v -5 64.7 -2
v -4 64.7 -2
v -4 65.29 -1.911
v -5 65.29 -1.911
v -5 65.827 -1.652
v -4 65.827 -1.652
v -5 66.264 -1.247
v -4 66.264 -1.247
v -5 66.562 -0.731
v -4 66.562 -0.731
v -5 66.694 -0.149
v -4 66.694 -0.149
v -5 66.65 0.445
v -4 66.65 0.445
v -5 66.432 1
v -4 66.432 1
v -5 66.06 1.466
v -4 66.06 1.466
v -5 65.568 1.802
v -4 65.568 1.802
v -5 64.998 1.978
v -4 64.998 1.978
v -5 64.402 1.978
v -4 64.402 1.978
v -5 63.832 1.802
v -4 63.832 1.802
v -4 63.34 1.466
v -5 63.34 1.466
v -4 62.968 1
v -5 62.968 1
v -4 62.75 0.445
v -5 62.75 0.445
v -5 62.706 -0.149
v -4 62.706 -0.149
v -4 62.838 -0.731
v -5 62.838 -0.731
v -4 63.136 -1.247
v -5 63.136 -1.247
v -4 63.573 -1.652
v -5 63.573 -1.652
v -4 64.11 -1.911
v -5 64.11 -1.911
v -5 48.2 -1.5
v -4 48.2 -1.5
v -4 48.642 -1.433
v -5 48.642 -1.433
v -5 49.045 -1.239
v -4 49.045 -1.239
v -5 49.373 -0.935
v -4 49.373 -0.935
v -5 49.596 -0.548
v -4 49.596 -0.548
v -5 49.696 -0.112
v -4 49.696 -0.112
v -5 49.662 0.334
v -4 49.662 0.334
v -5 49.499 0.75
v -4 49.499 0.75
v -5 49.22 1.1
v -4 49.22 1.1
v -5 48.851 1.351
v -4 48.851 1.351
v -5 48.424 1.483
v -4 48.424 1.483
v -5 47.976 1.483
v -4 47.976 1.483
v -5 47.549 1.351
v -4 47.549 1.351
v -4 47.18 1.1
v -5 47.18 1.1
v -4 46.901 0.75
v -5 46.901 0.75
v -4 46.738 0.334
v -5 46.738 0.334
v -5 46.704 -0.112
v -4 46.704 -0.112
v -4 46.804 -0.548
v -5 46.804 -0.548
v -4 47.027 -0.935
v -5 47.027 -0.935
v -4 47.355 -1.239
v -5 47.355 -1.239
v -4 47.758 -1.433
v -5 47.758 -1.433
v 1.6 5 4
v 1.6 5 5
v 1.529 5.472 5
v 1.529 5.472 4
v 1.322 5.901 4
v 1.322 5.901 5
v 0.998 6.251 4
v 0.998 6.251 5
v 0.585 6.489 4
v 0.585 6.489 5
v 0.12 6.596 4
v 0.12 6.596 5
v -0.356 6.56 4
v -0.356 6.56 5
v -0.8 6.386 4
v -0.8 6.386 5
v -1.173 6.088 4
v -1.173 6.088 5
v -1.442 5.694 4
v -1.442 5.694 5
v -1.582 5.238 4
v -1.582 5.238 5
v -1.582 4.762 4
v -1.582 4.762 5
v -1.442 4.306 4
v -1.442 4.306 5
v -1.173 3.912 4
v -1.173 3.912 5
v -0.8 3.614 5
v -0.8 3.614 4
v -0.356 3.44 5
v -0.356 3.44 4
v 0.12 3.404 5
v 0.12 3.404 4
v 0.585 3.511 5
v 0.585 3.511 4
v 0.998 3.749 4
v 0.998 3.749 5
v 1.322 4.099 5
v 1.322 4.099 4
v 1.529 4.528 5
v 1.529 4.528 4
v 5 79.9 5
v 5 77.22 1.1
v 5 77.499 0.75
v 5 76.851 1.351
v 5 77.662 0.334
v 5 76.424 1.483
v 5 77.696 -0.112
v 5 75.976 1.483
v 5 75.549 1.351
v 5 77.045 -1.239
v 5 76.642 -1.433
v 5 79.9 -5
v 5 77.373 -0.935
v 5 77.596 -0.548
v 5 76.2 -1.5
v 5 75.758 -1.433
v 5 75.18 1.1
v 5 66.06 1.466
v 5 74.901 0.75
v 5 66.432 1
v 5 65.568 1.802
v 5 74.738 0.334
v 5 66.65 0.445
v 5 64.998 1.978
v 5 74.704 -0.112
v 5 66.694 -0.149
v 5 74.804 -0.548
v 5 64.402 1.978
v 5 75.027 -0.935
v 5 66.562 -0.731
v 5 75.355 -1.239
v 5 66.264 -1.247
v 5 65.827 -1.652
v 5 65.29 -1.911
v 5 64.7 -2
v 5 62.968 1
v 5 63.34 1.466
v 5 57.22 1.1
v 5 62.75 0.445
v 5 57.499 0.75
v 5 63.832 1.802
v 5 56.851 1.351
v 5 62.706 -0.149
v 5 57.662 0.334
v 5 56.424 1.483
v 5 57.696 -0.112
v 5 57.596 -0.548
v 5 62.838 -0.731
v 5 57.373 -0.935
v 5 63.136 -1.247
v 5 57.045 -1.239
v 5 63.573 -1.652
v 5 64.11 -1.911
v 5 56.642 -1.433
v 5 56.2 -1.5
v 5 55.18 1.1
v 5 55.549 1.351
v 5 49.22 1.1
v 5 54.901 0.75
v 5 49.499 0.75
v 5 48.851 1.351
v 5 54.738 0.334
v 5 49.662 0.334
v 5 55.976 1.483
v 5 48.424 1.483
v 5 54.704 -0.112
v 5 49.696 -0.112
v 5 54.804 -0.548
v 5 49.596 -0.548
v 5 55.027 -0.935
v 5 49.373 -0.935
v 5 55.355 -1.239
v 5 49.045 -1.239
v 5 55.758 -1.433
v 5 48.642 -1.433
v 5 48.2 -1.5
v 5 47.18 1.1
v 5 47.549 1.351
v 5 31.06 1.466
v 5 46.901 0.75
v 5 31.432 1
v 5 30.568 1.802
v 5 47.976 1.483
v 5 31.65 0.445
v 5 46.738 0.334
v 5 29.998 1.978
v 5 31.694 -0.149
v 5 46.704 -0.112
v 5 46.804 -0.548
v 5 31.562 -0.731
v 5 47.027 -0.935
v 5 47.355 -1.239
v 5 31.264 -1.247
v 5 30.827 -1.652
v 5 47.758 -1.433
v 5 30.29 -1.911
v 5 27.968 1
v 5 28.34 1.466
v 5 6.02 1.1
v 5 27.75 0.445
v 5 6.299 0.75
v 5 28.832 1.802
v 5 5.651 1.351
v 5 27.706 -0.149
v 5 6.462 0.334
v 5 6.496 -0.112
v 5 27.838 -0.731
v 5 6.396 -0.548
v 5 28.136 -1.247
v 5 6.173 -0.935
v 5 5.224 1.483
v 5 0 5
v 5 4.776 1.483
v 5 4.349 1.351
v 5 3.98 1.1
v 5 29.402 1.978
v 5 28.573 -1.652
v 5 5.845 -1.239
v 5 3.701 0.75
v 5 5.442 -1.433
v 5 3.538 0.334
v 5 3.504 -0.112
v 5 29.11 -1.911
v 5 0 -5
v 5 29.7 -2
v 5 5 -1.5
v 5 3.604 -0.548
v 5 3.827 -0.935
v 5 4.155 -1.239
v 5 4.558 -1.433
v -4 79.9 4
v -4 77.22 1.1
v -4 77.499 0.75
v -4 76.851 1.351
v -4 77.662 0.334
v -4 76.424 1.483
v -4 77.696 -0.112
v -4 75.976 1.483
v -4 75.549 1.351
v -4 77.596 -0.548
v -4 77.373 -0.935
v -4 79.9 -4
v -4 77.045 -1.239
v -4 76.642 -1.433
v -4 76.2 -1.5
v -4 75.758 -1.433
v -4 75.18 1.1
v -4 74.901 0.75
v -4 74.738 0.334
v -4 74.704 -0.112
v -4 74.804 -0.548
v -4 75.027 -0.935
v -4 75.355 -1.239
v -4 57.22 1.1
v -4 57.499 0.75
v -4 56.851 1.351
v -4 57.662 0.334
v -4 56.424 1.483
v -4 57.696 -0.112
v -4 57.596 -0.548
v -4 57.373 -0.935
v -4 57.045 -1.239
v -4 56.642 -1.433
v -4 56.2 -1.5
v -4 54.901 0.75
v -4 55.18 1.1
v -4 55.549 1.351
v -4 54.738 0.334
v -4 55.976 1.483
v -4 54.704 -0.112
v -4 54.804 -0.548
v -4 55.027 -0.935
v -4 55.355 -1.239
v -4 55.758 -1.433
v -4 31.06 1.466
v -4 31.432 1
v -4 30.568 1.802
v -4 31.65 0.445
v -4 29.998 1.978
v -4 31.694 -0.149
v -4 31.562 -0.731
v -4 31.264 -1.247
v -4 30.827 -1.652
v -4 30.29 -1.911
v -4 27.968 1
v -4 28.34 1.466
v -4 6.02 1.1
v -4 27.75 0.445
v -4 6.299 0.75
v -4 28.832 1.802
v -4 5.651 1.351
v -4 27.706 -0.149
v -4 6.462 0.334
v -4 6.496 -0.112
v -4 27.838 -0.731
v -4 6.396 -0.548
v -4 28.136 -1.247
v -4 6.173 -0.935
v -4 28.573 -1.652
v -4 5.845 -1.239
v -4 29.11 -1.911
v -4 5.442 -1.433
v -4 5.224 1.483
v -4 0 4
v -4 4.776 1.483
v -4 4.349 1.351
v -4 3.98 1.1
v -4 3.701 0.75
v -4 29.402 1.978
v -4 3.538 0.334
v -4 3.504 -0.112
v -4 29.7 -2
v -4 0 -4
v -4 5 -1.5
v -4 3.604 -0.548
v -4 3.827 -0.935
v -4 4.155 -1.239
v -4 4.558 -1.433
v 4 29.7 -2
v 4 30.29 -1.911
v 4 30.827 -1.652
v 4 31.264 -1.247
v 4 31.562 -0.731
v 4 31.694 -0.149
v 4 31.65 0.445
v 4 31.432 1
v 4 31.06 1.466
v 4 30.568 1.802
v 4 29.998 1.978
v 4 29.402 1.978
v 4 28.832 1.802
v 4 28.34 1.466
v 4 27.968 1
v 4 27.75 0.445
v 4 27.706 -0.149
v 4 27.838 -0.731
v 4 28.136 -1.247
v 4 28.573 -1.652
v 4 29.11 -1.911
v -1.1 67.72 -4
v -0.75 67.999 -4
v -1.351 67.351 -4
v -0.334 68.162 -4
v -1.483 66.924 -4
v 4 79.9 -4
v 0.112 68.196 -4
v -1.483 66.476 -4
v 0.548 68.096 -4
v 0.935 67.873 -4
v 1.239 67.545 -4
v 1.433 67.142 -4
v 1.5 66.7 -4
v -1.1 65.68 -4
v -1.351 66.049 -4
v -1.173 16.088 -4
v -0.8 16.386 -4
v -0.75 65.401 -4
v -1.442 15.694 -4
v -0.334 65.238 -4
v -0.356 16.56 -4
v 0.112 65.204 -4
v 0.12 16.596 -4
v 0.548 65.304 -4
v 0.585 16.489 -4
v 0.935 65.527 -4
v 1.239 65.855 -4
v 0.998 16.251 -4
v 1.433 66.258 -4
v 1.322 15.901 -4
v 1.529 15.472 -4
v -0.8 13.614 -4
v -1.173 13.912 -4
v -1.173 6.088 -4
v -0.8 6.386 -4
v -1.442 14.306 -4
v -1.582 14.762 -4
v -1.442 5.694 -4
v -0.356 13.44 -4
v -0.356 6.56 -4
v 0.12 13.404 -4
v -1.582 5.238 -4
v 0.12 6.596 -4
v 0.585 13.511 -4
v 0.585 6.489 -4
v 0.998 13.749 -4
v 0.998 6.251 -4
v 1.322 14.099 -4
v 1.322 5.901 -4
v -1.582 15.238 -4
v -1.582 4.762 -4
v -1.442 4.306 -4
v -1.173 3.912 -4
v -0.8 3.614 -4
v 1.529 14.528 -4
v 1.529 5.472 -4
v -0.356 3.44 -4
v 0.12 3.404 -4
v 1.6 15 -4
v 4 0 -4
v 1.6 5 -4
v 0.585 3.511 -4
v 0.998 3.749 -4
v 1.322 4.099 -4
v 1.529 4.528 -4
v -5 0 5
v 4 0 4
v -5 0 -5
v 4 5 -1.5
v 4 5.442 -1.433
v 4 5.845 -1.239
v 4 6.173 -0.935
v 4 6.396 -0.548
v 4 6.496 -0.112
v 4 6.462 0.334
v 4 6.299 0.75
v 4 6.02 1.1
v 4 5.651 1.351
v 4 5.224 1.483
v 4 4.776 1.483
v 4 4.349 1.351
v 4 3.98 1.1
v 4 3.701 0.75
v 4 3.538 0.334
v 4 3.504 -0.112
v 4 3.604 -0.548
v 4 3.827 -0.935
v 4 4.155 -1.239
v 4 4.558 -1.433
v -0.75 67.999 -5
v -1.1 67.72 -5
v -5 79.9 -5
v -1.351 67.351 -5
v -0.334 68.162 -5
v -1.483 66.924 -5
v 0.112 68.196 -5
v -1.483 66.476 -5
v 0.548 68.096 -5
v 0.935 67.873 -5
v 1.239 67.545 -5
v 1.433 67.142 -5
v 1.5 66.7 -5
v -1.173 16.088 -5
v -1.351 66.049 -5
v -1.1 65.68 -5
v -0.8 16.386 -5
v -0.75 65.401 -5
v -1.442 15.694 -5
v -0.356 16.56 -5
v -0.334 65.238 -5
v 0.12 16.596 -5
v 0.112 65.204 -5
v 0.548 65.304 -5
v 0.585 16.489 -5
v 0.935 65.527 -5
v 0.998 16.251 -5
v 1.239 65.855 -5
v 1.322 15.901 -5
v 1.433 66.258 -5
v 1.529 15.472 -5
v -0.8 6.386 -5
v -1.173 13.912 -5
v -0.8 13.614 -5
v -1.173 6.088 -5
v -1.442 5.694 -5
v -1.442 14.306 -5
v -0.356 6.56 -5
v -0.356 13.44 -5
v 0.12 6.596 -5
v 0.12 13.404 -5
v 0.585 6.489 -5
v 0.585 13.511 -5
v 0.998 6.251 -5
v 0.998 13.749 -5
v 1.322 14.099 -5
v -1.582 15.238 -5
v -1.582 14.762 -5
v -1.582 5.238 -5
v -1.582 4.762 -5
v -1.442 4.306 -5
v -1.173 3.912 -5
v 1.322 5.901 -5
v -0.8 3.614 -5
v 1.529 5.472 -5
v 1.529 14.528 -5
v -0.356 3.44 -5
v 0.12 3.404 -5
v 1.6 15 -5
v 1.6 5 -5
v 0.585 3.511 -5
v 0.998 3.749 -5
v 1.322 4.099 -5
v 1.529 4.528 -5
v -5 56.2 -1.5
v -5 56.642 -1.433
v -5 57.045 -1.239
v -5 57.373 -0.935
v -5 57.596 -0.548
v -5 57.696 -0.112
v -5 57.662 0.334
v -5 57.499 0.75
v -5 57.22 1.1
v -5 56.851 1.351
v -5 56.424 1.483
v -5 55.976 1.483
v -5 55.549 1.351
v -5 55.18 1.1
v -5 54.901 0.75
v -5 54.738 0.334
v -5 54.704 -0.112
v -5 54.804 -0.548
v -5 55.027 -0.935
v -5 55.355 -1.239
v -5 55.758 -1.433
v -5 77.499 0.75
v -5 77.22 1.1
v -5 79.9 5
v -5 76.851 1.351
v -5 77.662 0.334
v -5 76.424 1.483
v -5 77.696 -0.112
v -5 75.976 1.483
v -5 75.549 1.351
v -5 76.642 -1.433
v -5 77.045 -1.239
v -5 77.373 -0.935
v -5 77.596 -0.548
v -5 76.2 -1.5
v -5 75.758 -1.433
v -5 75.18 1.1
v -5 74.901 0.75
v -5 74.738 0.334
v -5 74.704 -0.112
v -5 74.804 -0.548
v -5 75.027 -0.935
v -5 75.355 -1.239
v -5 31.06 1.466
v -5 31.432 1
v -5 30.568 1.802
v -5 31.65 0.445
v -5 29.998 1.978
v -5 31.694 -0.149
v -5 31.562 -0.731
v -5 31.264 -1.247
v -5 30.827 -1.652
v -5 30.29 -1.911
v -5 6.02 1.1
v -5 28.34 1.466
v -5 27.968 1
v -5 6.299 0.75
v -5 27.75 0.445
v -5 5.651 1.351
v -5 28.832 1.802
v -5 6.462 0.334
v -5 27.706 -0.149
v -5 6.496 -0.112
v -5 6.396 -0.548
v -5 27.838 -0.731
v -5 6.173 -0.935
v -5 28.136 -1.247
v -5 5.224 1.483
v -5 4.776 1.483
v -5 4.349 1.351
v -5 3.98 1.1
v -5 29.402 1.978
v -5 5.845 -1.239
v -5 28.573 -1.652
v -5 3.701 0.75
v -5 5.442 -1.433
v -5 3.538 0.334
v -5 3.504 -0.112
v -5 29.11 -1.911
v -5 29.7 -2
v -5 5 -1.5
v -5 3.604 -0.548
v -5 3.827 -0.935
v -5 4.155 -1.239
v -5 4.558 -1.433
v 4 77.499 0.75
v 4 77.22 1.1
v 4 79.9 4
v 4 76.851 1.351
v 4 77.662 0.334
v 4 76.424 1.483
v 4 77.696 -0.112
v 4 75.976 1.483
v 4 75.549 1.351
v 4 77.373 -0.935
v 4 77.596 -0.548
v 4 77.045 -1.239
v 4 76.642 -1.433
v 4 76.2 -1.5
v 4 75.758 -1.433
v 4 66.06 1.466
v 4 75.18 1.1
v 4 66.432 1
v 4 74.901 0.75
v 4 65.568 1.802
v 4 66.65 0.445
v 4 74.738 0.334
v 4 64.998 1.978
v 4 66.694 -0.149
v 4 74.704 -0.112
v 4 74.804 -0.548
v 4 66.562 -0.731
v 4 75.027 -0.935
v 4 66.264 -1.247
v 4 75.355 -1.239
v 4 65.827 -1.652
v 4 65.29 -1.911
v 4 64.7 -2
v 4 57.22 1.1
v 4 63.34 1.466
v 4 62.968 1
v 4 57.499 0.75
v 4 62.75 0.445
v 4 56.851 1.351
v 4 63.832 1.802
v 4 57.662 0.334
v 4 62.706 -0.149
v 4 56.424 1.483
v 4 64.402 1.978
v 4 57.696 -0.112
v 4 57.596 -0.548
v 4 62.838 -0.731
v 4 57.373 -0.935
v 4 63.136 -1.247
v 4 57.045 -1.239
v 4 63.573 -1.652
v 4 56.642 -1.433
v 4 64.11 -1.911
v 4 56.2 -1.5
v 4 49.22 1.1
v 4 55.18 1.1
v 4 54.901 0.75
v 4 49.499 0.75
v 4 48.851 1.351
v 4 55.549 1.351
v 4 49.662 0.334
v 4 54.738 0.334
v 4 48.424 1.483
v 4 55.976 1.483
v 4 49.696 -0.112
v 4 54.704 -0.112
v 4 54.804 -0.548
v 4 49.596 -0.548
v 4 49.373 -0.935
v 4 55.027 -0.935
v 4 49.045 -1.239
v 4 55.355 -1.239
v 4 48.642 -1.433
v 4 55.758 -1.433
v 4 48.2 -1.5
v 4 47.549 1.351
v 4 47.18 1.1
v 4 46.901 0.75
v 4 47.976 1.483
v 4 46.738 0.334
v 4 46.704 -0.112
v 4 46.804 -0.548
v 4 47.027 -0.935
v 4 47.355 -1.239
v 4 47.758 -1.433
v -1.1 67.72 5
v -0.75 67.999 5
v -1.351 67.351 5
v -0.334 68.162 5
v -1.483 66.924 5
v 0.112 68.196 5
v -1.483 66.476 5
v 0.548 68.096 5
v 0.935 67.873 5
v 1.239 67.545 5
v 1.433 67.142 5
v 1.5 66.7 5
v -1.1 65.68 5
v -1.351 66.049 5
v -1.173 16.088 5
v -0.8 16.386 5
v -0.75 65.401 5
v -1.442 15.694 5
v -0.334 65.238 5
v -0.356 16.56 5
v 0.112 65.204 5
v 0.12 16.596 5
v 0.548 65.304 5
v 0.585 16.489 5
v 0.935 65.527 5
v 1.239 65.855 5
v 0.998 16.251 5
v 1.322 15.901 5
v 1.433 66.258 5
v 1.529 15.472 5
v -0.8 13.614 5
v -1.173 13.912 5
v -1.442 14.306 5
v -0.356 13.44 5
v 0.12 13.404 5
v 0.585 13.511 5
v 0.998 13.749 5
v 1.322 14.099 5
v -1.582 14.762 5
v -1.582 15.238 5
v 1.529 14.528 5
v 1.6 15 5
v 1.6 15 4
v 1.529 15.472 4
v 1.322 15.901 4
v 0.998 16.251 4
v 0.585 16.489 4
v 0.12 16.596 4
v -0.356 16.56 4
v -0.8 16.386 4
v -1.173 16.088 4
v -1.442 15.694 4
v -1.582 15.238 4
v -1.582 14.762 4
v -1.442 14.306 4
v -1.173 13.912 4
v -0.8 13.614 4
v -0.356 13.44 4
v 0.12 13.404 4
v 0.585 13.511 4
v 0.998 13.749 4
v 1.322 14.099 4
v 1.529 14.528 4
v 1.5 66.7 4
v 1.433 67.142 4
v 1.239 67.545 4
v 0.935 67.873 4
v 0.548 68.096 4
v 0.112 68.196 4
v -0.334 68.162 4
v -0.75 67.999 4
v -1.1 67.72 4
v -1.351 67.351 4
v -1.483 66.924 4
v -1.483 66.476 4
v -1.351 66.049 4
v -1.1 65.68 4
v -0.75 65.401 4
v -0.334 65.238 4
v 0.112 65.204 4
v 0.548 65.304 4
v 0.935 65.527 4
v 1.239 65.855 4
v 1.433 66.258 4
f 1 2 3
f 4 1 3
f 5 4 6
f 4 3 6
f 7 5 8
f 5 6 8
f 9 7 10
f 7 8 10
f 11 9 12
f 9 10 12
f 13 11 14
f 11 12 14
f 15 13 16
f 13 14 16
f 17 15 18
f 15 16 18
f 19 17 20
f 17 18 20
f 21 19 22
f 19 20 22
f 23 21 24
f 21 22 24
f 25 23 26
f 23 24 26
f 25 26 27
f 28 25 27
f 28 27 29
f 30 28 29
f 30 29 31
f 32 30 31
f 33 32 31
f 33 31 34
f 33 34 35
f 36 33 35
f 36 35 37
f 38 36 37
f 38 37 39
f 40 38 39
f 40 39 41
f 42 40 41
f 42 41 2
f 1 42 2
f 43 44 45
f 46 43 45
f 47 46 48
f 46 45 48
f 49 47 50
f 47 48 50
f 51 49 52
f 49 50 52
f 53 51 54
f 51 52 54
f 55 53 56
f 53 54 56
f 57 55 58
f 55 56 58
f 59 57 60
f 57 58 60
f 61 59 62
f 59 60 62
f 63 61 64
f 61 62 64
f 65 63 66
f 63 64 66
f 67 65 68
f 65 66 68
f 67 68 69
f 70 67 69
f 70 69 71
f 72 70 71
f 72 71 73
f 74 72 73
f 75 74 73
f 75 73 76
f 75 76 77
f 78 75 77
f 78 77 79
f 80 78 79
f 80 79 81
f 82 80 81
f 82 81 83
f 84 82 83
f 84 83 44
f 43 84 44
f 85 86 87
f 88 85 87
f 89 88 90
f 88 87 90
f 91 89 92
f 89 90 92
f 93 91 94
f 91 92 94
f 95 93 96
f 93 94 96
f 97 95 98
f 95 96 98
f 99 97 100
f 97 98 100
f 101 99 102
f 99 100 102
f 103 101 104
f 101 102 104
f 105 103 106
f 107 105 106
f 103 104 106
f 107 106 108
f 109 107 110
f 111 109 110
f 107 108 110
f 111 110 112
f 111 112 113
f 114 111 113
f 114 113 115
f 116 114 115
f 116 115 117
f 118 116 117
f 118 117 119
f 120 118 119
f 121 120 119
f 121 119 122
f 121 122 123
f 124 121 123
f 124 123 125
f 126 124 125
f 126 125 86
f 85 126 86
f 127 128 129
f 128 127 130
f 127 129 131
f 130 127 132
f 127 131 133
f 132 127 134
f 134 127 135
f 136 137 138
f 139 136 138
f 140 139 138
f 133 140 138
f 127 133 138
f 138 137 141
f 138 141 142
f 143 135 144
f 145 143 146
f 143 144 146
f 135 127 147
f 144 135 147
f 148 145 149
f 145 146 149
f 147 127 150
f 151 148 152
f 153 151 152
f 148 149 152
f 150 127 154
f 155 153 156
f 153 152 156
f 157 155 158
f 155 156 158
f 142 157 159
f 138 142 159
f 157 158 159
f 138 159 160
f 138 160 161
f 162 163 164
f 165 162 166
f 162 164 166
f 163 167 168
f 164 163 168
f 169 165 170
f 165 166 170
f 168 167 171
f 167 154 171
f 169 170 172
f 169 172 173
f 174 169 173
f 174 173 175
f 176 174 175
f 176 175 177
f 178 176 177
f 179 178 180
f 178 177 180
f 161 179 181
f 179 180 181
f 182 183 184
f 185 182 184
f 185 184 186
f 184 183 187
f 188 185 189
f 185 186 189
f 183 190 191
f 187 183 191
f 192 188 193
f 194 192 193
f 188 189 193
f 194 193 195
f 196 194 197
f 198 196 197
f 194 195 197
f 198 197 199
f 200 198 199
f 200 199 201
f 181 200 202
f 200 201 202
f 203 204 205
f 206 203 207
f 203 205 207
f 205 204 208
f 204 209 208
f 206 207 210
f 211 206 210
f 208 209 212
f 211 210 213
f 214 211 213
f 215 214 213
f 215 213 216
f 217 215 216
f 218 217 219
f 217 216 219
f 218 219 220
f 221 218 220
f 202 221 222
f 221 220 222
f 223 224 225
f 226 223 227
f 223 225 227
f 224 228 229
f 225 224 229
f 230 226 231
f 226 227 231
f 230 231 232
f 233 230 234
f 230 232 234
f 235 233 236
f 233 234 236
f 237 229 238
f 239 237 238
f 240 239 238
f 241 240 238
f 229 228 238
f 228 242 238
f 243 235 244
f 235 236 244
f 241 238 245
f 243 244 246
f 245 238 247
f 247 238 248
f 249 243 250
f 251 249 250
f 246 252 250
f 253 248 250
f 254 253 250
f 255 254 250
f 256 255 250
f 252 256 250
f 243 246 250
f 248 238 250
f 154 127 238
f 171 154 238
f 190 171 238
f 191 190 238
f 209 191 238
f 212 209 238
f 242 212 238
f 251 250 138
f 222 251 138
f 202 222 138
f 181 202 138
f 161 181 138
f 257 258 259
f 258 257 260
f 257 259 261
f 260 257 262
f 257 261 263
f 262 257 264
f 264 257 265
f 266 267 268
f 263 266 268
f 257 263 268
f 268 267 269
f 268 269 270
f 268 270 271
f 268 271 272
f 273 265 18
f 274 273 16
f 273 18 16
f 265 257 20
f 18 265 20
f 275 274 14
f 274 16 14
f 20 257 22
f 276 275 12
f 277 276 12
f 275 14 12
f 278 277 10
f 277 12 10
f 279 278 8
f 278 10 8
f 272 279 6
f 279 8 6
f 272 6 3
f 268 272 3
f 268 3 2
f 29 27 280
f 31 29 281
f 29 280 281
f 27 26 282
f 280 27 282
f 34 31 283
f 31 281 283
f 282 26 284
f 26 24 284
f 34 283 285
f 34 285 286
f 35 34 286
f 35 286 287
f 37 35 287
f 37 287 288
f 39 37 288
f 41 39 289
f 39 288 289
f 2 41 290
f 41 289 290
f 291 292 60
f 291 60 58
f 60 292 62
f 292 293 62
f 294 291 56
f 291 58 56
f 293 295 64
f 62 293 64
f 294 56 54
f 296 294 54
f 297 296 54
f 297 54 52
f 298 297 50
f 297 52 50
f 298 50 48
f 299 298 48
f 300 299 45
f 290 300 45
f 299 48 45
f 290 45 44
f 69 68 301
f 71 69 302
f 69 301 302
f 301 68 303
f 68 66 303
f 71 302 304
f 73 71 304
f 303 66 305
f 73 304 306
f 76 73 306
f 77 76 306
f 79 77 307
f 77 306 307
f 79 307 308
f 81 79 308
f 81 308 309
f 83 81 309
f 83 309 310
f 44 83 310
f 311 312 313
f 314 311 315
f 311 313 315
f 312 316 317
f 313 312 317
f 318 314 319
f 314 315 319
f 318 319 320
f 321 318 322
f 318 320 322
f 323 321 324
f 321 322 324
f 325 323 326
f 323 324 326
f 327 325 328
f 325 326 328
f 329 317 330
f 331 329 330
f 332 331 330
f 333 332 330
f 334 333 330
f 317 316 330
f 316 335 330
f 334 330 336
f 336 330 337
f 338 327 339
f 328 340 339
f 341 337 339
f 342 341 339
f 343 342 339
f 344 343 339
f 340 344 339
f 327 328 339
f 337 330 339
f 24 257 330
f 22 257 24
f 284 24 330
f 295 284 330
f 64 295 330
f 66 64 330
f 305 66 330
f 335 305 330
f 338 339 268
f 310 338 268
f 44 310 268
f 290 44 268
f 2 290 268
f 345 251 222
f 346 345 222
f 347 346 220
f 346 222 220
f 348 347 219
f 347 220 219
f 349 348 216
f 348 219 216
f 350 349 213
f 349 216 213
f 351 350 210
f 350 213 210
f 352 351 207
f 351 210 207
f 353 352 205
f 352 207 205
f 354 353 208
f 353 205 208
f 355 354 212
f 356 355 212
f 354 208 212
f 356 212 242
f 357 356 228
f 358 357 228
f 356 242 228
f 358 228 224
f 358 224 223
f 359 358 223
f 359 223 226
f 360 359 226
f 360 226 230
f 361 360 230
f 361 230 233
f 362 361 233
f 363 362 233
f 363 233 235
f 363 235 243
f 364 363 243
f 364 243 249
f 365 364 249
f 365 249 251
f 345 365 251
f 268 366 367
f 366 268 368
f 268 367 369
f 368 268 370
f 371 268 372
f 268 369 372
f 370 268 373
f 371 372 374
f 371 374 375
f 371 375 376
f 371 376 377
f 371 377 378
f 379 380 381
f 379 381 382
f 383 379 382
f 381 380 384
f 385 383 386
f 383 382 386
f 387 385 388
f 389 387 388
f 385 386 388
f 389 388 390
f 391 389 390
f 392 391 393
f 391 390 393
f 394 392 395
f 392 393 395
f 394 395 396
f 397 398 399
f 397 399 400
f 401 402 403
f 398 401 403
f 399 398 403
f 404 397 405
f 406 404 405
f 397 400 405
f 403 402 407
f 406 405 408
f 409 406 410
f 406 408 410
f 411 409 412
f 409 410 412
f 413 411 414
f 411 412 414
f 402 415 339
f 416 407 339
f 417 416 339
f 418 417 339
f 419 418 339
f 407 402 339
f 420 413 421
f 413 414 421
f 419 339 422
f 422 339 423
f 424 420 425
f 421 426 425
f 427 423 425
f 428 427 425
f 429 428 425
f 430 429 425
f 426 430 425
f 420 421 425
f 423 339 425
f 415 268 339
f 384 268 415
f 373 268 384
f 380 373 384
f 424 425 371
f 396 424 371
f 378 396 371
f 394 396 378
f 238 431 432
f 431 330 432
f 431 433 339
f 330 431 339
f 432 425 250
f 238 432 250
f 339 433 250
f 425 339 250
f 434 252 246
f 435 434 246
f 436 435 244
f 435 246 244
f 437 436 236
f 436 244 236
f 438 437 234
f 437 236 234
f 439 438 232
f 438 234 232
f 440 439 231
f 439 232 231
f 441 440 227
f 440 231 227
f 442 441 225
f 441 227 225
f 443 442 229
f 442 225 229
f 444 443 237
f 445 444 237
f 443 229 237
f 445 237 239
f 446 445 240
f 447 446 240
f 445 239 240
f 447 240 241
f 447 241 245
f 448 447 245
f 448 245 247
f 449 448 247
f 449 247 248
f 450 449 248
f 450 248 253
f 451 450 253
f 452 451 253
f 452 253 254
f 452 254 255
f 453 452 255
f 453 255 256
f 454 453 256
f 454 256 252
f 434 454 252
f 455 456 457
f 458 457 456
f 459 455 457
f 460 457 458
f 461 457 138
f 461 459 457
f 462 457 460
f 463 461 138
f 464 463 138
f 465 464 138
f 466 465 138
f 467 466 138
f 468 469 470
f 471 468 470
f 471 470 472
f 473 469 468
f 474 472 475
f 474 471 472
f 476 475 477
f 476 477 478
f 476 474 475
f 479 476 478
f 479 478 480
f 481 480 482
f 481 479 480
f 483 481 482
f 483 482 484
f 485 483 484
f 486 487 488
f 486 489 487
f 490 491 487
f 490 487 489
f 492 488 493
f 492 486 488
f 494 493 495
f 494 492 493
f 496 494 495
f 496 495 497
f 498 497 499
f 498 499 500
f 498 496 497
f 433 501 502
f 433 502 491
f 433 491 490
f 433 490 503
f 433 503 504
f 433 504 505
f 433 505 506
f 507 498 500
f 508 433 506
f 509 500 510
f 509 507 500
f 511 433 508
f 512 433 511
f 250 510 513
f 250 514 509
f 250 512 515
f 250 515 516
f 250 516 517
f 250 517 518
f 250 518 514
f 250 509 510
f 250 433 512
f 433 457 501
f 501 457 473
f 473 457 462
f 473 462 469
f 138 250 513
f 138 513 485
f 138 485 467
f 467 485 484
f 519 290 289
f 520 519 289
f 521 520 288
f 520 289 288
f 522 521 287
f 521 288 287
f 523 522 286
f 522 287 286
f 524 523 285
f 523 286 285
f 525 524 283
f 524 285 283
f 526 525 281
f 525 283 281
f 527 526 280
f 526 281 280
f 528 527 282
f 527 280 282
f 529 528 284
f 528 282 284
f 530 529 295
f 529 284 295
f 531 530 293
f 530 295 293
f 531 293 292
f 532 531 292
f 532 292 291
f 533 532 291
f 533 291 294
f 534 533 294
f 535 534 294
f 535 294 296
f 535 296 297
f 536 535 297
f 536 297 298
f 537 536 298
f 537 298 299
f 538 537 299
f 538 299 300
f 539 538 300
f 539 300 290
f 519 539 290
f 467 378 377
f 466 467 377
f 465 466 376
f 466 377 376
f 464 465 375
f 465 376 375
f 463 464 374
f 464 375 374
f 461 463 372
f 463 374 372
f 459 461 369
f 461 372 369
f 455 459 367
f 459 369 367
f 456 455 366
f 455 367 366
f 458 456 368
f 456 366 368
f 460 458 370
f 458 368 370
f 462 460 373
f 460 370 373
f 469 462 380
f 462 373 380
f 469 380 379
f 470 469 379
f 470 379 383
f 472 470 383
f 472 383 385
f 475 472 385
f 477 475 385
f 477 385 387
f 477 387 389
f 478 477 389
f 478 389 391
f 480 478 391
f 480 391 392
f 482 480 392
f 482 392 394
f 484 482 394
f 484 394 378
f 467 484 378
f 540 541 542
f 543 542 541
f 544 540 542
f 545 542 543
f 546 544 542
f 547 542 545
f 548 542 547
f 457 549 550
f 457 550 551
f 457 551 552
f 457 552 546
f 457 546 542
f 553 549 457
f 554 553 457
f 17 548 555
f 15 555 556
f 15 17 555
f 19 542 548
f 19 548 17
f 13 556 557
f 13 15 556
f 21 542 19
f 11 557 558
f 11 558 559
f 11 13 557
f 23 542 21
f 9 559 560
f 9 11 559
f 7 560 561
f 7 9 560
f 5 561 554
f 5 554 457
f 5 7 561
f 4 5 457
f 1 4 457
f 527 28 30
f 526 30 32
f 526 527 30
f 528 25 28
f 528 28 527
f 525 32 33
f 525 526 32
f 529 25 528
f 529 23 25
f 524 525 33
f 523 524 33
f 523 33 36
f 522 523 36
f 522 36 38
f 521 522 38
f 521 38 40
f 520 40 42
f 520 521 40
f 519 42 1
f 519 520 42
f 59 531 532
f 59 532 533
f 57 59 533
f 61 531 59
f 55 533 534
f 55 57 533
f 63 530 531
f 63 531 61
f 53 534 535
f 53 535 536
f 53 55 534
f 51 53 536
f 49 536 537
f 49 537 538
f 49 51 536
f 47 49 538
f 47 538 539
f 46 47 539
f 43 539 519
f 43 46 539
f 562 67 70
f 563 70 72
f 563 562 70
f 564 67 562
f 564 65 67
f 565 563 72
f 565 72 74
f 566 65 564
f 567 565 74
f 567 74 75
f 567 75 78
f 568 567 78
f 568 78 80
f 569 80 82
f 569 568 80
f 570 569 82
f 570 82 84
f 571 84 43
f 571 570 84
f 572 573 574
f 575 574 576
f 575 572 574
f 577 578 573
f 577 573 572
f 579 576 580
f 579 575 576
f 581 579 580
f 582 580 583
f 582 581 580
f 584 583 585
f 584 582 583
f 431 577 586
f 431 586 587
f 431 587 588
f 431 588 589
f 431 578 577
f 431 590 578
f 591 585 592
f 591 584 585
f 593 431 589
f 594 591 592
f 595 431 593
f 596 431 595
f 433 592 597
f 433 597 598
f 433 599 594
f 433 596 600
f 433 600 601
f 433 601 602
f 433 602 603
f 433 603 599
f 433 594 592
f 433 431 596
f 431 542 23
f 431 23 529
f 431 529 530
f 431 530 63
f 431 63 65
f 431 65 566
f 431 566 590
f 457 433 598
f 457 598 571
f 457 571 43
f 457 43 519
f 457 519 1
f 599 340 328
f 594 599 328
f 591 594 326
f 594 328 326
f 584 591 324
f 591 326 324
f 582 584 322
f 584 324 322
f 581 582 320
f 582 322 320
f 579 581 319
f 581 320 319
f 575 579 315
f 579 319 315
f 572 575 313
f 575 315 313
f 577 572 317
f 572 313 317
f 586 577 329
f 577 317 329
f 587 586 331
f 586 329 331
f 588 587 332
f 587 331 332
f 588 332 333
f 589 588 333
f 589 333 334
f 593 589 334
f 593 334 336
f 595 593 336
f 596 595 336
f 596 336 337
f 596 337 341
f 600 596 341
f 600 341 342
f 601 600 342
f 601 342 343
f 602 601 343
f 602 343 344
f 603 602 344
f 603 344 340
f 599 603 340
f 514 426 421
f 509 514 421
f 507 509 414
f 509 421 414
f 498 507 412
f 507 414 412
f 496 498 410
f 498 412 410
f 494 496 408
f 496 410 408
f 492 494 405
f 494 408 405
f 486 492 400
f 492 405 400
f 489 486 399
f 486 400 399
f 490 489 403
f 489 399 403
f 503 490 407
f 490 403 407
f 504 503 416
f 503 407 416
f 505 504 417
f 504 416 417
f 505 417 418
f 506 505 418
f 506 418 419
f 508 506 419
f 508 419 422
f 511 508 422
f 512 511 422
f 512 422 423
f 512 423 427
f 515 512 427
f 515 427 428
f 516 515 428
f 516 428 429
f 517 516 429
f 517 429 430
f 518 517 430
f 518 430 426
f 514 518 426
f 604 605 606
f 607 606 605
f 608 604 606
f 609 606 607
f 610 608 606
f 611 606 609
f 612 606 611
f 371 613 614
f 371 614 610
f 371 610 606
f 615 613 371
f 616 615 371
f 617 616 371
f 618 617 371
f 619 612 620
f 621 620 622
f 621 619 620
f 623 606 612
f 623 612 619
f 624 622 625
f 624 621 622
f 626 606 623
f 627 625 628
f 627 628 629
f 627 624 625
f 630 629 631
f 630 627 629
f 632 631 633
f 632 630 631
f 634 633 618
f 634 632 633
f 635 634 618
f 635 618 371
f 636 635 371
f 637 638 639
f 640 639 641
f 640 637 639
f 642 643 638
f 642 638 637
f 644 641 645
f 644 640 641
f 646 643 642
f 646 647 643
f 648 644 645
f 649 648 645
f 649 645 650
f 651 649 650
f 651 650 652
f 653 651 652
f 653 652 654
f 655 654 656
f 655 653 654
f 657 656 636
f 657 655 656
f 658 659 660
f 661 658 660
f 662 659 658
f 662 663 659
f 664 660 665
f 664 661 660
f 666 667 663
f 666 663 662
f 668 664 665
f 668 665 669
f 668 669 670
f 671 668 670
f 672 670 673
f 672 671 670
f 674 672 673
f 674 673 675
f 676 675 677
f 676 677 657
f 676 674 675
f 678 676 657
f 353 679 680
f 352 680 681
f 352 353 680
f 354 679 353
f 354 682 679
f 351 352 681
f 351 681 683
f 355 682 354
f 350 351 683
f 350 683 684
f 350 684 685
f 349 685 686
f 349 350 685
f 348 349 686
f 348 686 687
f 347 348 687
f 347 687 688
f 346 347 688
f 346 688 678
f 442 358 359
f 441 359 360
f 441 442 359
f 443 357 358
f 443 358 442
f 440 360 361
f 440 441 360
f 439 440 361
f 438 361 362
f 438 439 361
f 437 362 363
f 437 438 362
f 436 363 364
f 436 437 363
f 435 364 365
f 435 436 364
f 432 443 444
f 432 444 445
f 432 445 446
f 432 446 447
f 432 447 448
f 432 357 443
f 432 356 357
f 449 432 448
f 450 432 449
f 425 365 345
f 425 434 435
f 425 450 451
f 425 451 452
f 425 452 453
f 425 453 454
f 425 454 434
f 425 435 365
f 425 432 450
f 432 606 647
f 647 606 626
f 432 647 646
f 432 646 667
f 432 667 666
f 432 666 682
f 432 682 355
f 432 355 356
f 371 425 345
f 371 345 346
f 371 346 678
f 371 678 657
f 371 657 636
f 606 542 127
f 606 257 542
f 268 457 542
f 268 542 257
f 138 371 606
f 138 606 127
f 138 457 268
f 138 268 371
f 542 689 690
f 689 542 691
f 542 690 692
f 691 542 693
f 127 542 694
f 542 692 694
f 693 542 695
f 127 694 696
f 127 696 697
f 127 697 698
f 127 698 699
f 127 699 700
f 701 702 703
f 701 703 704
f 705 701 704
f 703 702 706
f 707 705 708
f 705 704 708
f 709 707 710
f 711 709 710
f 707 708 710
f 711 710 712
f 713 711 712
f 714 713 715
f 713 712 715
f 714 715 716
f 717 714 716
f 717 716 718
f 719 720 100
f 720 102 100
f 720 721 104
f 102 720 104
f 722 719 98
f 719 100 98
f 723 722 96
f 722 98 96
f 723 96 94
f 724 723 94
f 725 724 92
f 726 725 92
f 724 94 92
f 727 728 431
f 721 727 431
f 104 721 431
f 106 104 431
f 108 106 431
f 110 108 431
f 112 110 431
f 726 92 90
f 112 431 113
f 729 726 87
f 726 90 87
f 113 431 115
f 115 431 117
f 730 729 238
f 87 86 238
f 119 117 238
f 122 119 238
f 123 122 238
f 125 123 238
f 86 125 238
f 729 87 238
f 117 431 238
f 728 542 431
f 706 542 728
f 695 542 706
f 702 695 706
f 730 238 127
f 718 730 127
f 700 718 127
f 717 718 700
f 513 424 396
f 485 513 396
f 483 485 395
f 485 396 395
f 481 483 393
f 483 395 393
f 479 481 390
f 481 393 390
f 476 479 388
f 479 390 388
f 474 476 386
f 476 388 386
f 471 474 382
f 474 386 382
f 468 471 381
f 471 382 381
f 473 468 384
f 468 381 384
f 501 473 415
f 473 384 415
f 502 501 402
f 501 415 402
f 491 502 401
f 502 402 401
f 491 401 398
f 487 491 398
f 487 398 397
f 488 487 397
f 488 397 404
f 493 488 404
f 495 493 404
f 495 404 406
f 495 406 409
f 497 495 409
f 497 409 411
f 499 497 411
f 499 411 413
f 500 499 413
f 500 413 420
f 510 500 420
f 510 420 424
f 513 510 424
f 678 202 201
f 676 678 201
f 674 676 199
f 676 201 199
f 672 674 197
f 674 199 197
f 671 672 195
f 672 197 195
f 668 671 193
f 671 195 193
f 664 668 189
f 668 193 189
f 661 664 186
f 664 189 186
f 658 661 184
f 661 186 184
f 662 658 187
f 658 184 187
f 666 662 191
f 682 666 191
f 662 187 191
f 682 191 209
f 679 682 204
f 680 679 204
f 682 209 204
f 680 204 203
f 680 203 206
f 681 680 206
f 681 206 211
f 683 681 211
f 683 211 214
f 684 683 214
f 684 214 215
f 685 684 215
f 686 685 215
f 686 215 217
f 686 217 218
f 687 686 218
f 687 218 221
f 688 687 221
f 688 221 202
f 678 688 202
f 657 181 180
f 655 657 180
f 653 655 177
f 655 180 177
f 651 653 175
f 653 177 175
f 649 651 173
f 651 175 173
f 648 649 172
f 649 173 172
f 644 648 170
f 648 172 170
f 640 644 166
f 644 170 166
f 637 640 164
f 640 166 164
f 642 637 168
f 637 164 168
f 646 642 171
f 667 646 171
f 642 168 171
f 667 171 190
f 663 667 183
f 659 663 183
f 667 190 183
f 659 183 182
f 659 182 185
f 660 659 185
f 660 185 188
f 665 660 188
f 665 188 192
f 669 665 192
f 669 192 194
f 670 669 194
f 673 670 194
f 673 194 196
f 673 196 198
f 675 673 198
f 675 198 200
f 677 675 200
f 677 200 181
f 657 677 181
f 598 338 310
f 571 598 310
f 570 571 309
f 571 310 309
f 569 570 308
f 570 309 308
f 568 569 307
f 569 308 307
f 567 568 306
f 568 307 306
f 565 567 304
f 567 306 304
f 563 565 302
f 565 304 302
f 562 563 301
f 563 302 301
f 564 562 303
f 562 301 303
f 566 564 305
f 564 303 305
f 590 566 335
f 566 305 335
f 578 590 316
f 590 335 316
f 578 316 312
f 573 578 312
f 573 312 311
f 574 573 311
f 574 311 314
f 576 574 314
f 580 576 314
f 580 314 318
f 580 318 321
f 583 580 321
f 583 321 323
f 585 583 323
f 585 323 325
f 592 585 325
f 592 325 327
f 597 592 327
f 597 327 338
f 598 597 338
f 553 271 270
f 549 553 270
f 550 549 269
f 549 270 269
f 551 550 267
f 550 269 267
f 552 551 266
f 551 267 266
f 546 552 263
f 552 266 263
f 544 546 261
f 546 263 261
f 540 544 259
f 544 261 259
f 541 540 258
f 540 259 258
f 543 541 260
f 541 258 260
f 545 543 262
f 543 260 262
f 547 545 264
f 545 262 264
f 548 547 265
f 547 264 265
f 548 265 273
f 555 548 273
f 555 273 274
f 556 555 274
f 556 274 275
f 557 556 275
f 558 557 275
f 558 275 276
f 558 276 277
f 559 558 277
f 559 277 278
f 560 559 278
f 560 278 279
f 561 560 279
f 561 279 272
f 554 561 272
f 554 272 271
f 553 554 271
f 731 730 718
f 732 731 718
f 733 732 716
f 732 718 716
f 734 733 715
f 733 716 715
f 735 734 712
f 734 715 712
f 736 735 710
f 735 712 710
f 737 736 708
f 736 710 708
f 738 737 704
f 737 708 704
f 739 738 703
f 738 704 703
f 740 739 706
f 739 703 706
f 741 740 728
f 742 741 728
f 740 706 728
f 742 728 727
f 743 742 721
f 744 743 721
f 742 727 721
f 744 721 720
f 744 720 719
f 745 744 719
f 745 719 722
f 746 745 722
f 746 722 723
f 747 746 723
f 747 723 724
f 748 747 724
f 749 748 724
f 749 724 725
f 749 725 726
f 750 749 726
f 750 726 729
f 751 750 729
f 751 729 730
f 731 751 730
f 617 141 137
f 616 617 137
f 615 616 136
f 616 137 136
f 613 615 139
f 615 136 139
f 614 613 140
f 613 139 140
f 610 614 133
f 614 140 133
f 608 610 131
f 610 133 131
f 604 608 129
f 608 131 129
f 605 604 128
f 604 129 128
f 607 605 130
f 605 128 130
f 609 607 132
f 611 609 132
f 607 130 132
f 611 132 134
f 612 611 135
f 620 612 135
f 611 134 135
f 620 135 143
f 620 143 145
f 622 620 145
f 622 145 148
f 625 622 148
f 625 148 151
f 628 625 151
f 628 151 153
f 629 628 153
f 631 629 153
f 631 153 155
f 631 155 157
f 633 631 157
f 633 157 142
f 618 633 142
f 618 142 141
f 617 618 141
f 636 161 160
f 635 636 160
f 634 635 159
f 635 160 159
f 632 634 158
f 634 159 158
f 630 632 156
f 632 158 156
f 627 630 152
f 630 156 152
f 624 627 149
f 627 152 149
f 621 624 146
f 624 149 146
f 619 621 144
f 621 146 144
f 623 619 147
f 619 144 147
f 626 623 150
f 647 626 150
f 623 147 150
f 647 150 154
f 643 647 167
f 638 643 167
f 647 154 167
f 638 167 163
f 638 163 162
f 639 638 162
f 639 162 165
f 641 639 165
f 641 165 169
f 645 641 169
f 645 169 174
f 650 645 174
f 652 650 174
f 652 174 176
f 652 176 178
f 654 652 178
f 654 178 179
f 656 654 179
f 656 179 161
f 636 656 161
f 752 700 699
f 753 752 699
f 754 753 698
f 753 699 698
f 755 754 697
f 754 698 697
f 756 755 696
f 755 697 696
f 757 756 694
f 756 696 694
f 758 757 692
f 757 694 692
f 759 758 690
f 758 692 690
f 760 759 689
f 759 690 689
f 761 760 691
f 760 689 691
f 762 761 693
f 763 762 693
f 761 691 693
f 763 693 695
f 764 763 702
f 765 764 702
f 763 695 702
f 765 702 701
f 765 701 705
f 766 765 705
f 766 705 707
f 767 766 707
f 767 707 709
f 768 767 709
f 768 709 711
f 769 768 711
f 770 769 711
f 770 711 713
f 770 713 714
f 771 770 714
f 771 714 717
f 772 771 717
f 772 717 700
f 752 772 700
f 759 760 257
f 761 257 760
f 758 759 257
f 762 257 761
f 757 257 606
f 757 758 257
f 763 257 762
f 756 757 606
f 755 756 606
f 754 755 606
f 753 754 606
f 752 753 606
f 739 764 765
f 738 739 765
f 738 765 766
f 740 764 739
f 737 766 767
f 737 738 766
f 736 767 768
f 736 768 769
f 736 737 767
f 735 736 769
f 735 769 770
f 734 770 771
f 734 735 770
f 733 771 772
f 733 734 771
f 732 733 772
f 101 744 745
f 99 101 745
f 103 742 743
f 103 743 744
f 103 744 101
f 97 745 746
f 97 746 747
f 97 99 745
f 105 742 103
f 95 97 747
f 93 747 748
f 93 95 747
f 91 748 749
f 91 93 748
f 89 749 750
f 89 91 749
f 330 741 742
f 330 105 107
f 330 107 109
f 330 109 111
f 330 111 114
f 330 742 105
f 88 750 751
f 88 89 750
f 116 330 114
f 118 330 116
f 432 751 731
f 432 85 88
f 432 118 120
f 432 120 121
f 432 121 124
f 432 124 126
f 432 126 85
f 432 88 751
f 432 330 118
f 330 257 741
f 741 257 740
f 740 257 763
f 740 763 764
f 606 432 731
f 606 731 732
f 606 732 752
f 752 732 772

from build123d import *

# Parameters (mm, degrees)
SKETCH_1_W          = 10
SKETCH_1_H          = 10
SKETCH_1_W_2        = 8
SKETCH_1_H_2        = 8
EXTRUDE_1_DEPTH     = 104.9
SKETCH_2_R          = 1.6
SKETCH_2_R_2        = 1.5
CUT_EXTRUDE_1_DEPTH = 106.494123059
SKETCH_3_R          = 1.5
SKETCH_3_R_2        = 2
CUT_EXTRUDE_2_DEPTH = 106.494123059
SKETCH_4_W          = 10
SKETCH_4_H          = 10
CUT_EXTRUDE_3_DEPTH = 25


with BuildPart() as part:
    # ｽｹｯﾁ1 → 押し出し-薄板1 (new body)
    with BuildSketch(Plane(origin=(0, 0, 0), x_dir=(1, 0, 0), z_dir=(0, 1, 0))):
        Rectangle(SKETCH_1_W, SKETCH_1_H)
        Rectangle(SKETCH_1_W_2, SKETCH_1_H_2, mode=Mode.SUBTRACT)
    extrude(amount=EXTRUDE_1_DEPTH)

    # ｽｹｯﾁ2 → ｶｯﾄ - 押し出し1 (cut, through all)
    with BuildSketch(Plane.XY.offset(5)):
        with Locations((0, 5)):
            Circle(SKETCH_2_R)
        with Locations((0, 15)):
            Circle(SKETCH_2_R)
        with Locations((0, 92.95)):
            Circle(SKETCH_2_R_2)
        with Locations((0, 66.7)):
            Circle(SKETCH_2_R_2)
        with Locations((0, 99.9)):
            Circle(SKETCH_2_R_2)
    extrude(amount=-CUT_EXTRUDE_1_DEPTH, mode=Mode.SUBTRACT)

    # ｽｹｯﾁ3 → ｶｯﾄ - 押し出し2 (cut, through all)
    with BuildSketch(Plane(origin=(5, 0, 0), x_dir=(0, 0, -1), z_dir=(1, 0, 0))):
        with Locations((0, 76.2)):
            Circle(SKETCH_3_R)
        with Locations((0, 5)):
            Circle(SKETCH_3_R)
        with Locations((0, 64.7)):
            Circle(SKETCH_3_R_2)
        with Locations((0, 29.7)):
            Circle(SKETCH_3_R_2)
        with Locations((0, 48.2)):
            Circle(SKETCH_3_R)
        with Locations((0, 56.2)):
            Circle(SKETCH_3_R)
    extrude(amount=-CUT_EXTRUDE_2_DEPTH, mode=Mode.SUBTRACT)

    # ｽｹｯﾁ4 → ｶｯﾄ - 押し出し3 (cut)
    with BuildSketch(Plane(origin=(0, 104.9, 0), x_dir=(1, 0, 0), z_dir=(0, 1, 0))):
        Rectangle(SKETCH_4_W, SKETCH_4_H)
    extrude(amount=-CUT_EXTRUDE_3_DEPTH, mode=Mode.SUBTRACT)


solid = part.part
